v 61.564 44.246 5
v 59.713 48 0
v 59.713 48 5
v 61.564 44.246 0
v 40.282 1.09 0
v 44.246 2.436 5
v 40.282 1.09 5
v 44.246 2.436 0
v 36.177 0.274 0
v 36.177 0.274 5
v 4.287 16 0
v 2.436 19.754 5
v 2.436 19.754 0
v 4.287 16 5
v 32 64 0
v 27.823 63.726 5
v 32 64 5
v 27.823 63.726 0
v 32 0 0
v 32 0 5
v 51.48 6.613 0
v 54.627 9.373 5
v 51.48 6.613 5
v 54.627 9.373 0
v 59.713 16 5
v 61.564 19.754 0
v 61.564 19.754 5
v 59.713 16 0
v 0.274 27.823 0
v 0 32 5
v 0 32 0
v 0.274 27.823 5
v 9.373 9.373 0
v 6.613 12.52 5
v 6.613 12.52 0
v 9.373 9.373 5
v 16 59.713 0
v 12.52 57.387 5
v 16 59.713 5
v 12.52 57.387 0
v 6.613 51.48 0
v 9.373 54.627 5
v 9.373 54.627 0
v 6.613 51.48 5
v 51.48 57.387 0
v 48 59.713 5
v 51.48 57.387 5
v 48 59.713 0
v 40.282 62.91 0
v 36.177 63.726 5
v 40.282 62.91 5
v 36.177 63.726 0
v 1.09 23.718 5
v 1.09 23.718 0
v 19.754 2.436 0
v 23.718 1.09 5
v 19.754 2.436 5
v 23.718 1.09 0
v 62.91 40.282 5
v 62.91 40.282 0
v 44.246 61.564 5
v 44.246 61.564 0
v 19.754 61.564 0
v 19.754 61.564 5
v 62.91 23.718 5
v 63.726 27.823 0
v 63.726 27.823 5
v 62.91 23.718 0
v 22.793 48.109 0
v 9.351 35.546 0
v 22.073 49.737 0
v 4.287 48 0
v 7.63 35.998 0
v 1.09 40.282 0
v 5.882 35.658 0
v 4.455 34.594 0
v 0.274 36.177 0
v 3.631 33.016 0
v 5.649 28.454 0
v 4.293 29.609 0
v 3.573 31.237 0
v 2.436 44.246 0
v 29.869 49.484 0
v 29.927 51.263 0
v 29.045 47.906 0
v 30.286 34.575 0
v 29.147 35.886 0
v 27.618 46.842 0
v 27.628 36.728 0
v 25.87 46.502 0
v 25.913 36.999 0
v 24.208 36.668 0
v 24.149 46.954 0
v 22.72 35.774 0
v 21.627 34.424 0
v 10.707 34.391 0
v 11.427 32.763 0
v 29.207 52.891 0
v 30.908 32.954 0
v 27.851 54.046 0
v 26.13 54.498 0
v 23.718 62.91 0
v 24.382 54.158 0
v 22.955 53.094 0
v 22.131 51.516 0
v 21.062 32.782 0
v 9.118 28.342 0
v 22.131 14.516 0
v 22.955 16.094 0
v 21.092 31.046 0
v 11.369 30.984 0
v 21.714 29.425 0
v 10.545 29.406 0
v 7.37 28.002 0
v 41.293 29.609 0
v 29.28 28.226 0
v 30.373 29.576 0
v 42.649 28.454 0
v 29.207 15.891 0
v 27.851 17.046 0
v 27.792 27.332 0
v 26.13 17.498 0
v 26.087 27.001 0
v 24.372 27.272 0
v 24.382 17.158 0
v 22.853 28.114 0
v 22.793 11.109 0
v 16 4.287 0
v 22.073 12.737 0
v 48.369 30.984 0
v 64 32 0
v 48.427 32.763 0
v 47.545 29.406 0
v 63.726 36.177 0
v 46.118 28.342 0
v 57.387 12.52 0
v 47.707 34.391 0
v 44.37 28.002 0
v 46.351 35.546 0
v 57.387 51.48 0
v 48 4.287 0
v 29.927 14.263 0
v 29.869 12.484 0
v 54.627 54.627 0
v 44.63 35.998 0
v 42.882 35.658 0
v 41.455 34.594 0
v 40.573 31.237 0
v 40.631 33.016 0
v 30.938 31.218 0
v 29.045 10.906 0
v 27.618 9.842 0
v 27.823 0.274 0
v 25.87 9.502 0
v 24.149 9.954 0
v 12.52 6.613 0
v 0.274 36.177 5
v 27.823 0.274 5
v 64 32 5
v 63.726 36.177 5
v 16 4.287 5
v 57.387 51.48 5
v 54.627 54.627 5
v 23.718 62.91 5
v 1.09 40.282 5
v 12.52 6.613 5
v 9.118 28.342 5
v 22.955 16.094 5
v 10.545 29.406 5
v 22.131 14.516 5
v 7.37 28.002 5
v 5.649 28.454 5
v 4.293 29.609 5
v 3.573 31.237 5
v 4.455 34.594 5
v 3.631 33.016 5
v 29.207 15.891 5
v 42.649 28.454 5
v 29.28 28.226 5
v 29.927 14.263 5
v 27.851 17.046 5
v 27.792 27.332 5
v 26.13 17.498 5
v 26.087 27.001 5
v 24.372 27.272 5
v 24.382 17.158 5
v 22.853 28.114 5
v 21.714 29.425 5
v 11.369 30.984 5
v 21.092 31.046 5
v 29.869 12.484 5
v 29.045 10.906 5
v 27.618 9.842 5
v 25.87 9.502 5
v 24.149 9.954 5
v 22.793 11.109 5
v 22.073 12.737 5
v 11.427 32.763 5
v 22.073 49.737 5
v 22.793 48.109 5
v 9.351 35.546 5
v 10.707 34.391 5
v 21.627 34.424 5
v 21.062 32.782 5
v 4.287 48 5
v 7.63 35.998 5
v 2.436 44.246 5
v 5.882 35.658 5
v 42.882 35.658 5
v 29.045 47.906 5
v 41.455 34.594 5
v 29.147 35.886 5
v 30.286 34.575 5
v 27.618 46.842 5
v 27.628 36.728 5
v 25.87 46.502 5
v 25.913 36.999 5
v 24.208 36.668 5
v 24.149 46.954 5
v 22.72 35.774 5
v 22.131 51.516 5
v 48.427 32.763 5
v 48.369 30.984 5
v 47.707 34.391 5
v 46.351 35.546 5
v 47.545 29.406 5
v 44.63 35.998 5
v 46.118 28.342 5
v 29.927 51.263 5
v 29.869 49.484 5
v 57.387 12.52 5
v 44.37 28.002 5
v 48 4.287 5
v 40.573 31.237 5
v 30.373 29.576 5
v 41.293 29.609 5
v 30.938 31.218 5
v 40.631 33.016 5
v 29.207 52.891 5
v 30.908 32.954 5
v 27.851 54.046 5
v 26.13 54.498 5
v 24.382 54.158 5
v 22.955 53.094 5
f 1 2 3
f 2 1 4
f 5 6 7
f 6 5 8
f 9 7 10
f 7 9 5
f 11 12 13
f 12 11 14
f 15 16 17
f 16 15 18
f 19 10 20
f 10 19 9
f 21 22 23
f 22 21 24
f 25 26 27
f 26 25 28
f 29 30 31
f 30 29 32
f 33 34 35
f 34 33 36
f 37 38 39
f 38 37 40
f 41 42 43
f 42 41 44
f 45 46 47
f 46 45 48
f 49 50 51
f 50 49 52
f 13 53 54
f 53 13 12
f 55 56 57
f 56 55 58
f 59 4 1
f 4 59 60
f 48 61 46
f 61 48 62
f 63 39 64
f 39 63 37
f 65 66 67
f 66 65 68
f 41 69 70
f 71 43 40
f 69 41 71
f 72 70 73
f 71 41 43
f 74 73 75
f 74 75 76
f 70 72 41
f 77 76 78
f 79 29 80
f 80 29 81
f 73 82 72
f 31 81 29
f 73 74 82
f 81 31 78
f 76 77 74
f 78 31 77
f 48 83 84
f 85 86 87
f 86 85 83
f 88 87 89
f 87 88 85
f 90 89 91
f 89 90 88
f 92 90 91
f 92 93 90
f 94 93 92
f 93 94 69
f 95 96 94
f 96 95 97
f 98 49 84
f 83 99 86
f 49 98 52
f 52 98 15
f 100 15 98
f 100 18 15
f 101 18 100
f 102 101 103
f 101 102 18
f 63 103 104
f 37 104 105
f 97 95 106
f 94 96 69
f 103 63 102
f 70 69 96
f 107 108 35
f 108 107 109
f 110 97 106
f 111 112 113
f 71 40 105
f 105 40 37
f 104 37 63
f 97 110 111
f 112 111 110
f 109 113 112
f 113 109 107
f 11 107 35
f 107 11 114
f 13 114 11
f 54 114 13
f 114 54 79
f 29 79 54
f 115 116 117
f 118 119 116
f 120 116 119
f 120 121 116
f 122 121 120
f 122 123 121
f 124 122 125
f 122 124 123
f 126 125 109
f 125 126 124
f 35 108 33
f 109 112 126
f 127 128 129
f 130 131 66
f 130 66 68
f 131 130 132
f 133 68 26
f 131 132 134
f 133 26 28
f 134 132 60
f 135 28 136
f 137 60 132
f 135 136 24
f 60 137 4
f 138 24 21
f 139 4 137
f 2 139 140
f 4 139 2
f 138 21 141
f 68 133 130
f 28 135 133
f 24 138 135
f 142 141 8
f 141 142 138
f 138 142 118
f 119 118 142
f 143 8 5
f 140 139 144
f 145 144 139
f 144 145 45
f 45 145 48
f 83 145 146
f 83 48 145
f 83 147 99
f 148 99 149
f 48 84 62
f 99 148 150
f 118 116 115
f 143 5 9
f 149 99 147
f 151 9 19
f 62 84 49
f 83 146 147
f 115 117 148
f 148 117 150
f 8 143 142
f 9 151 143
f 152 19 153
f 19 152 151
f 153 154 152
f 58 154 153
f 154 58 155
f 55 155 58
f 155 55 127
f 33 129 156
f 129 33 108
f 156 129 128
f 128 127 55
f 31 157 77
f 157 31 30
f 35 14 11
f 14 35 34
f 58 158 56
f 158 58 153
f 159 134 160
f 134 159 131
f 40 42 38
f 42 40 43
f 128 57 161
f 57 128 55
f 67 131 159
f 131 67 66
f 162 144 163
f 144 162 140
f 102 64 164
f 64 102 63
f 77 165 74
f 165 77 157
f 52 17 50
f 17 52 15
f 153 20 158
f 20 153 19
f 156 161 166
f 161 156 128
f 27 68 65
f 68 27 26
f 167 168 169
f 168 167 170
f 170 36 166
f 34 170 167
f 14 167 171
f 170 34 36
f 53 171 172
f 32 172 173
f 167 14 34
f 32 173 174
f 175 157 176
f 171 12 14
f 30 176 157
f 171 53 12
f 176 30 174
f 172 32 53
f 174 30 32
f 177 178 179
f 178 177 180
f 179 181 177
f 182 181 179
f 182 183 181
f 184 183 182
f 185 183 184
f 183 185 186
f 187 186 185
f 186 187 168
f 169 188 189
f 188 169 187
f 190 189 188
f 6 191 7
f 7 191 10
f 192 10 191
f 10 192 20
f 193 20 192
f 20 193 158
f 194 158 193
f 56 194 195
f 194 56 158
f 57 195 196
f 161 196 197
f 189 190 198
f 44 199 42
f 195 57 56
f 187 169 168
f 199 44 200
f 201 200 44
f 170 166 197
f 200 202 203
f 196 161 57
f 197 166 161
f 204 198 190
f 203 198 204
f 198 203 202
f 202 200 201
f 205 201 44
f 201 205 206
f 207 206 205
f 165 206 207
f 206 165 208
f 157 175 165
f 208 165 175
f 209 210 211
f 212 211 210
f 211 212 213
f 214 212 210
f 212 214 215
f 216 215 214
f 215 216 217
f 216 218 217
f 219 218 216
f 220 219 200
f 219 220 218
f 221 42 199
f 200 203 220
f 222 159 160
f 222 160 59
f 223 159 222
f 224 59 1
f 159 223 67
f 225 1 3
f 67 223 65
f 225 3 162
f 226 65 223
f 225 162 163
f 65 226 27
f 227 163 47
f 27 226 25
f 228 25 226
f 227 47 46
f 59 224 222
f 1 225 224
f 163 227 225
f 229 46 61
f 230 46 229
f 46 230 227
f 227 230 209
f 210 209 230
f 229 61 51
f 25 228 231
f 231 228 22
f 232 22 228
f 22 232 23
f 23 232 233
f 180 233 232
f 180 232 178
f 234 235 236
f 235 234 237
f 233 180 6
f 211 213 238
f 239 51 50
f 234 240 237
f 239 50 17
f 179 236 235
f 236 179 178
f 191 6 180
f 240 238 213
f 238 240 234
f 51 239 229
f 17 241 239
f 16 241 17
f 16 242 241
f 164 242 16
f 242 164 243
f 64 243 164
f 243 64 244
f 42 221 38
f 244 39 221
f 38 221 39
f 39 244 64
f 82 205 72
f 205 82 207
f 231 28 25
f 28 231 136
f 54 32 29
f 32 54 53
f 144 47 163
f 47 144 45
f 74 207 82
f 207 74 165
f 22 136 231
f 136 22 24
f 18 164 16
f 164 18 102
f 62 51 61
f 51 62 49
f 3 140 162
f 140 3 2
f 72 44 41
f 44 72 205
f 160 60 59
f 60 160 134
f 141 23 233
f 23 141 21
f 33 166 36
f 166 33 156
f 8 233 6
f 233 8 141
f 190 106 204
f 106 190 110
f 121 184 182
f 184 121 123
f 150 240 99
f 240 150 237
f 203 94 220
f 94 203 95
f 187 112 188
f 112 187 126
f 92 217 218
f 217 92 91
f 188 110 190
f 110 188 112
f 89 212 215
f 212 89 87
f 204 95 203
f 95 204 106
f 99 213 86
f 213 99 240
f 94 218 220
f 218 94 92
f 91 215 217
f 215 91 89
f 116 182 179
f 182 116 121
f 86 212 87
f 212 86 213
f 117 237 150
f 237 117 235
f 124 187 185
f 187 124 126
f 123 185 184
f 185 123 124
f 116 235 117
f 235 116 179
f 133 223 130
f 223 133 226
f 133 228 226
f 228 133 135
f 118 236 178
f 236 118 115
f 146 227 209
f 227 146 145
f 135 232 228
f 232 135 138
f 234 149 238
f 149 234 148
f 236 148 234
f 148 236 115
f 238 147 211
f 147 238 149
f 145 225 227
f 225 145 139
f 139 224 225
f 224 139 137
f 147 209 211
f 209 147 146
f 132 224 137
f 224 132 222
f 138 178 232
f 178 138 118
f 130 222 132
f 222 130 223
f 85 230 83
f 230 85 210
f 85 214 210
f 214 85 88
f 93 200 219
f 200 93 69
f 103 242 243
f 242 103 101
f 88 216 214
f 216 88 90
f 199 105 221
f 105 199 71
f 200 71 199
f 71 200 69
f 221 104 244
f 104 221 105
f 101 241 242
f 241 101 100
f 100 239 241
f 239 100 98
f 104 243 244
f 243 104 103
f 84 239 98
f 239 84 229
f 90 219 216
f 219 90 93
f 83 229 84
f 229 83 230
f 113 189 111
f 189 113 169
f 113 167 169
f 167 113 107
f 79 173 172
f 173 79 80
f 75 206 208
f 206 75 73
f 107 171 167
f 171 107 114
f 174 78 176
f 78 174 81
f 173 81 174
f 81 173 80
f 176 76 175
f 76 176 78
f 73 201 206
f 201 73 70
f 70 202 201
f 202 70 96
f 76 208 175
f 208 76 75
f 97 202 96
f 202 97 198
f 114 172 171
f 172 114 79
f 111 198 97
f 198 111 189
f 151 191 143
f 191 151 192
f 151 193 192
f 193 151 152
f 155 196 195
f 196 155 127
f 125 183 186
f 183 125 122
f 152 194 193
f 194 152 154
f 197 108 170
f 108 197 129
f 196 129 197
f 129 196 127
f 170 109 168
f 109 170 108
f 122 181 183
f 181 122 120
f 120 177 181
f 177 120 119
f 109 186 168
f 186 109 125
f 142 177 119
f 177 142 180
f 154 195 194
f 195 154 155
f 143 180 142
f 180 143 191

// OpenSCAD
$fn = 32;

// ----------------------------------------------------------------------
// Cam plate: eccentric cam, base R32
// ----------------------------------------------------------------------

// --- parameters (mm) ---
base_r = 32;              // base circle radius
lobe_h = 12;              // cam lobe rise
bore_r = 5;               // shaft bore radius
plate_t = 5;              // plate thickness, Z (extrusion height)
ecc = 6;                  // disc eccentricity
ring_r = 18.5;            // lightening ring radius
bolt_r = 4;               // lightening hole radius

profile = [[64, 32], [63.726, 36.177], [62.91, 40.282], [61.564, 44.246], [59.713, 48], [57.387, 51.48], [54.627, 54.627], [51.48, 57.387], [48, 59.713], [44.246, 61.564], [40.282, 62.91], [36.177, 63.726], [32, 64], [27.823, 63.726], [23.718, 62.91], [19.754, 61.564], [16, 59.713], [12.52, 57.387], [9.373, 54.627], [6.613, 51.48], [4.287, 48], [2.436, 44.246], [1.09, 40.282], [0.274, 36.177], [0, 32], [0.274, 27.823], [1.09, 23.718], [2.436, 19.754], [4.287, 16], [6.613, 12.52], [9.373, 9.373], [12.52, 6.613], [16, 4.287], [19.754, 2.436], [23.718, 1.09], [27.823, 0.274], [32, 0], [36.177, 0.274], [40.282, 1.09], [44.246, 2.436], [48, 4.287], [51.48, 6.613], [54.627, 9.373], [57.387, 12.52], [59.713, 16], [61.564, 19.754], [62.91, 23.718], [63.726, 27.823]];  // primary outline, 48 points, counter clockwise
void_1 = [[30.908, 32.954], [30.286, 34.575], [29.147, 35.886], [27.628, 36.728], [25.913, 36.999], [24.208, 36.668], [22.72, 35.774], [21.627, 34.424], [21.062, 32.782], [21.092, 31.046], [21.714, 29.425], [22.853, 28.114], [24.372, 27.272], [26.087, 27.001], [27.792, 27.332], [29.28, 28.226], [30.373, 29.576], [30.938, 31.218]];  // shaft bore, 18 points
void_2 = [[48.427, 32.763], [47.707, 34.391], [46.351, 35.546], [44.63, 35.998], [42.882, 35.658], [41.455, 34.594], [40.631, 33.016], [40.573, 31.237], [41.293, 29.609], [42.649, 28.454], [44.37, 28.002], [46.118, 28.342], [47.545, 29.406], [48.369, 30.984]];  // lightening hole 1, 14 points
void_3 = [[29.927, 51.263], [29.207, 52.891], [27.851, 54.046], [26.13, 54.498], [24.382, 54.158], [22.955, 53.094], [22.131, 51.516], [22.073, 49.737], [22.793, 48.109], [24.149, 46.954], [25.87, 46.502], [27.618, 46.842], [29.045, 47.906], [29.869, 49.484]];  // lightening hole 2, 14 points
void_4 = [[11.427, 32.763], [10.707, 34.391], [9.351, 35.546], [7.63, 35.998], [5.882, 35.658], [4.455, 34.594], [3.631, 33.016], [3.573, 31.237], [4.293, 29.609], [5.649, 28.454], [7.37, 28.002], [9.118, 28.342], [10.545, 29.406], [11.369, 30.984]];  // lightening hole 3, 14 points
void_5 = [[29.927, 14.263], [29.207, 15.891], [27.851, 17.046], [26.13, 17.498], [24.382, 17.158], [22.955, 16.094], [22.131, 14.516], [22.073, 12.737], [22.793, 11.109], [24.149, 9.954], [25.87, 9.502], [27.618, 9.842], [29.045, 10.906], [29.869, 12.484]];  // lightening hole 4, 14 points

// --- the one profile operation ---
difference() {
  linear_extrude(height = plate_t) polygon(points = profile);
  translate([0, 0, -1])
    linear_extrude(height = plate_t + 2) polygon(points = void_1);
  translate([0, 0, -1])
    linear_extrude(height = plate_t + 2) polygon(points = void_2);
  translate([0, 0, -1])
    linear_extrude(height = plate_t + 2) polygon(points = void_3);
  translate([0, 0, -1])
    linear_extrude(height = plate_t + 2) polygon(points = void_4);
  translate([0, 0, -1])
    linear_extrude(height = plate_t + 2) polygon(points = void_5);
}
